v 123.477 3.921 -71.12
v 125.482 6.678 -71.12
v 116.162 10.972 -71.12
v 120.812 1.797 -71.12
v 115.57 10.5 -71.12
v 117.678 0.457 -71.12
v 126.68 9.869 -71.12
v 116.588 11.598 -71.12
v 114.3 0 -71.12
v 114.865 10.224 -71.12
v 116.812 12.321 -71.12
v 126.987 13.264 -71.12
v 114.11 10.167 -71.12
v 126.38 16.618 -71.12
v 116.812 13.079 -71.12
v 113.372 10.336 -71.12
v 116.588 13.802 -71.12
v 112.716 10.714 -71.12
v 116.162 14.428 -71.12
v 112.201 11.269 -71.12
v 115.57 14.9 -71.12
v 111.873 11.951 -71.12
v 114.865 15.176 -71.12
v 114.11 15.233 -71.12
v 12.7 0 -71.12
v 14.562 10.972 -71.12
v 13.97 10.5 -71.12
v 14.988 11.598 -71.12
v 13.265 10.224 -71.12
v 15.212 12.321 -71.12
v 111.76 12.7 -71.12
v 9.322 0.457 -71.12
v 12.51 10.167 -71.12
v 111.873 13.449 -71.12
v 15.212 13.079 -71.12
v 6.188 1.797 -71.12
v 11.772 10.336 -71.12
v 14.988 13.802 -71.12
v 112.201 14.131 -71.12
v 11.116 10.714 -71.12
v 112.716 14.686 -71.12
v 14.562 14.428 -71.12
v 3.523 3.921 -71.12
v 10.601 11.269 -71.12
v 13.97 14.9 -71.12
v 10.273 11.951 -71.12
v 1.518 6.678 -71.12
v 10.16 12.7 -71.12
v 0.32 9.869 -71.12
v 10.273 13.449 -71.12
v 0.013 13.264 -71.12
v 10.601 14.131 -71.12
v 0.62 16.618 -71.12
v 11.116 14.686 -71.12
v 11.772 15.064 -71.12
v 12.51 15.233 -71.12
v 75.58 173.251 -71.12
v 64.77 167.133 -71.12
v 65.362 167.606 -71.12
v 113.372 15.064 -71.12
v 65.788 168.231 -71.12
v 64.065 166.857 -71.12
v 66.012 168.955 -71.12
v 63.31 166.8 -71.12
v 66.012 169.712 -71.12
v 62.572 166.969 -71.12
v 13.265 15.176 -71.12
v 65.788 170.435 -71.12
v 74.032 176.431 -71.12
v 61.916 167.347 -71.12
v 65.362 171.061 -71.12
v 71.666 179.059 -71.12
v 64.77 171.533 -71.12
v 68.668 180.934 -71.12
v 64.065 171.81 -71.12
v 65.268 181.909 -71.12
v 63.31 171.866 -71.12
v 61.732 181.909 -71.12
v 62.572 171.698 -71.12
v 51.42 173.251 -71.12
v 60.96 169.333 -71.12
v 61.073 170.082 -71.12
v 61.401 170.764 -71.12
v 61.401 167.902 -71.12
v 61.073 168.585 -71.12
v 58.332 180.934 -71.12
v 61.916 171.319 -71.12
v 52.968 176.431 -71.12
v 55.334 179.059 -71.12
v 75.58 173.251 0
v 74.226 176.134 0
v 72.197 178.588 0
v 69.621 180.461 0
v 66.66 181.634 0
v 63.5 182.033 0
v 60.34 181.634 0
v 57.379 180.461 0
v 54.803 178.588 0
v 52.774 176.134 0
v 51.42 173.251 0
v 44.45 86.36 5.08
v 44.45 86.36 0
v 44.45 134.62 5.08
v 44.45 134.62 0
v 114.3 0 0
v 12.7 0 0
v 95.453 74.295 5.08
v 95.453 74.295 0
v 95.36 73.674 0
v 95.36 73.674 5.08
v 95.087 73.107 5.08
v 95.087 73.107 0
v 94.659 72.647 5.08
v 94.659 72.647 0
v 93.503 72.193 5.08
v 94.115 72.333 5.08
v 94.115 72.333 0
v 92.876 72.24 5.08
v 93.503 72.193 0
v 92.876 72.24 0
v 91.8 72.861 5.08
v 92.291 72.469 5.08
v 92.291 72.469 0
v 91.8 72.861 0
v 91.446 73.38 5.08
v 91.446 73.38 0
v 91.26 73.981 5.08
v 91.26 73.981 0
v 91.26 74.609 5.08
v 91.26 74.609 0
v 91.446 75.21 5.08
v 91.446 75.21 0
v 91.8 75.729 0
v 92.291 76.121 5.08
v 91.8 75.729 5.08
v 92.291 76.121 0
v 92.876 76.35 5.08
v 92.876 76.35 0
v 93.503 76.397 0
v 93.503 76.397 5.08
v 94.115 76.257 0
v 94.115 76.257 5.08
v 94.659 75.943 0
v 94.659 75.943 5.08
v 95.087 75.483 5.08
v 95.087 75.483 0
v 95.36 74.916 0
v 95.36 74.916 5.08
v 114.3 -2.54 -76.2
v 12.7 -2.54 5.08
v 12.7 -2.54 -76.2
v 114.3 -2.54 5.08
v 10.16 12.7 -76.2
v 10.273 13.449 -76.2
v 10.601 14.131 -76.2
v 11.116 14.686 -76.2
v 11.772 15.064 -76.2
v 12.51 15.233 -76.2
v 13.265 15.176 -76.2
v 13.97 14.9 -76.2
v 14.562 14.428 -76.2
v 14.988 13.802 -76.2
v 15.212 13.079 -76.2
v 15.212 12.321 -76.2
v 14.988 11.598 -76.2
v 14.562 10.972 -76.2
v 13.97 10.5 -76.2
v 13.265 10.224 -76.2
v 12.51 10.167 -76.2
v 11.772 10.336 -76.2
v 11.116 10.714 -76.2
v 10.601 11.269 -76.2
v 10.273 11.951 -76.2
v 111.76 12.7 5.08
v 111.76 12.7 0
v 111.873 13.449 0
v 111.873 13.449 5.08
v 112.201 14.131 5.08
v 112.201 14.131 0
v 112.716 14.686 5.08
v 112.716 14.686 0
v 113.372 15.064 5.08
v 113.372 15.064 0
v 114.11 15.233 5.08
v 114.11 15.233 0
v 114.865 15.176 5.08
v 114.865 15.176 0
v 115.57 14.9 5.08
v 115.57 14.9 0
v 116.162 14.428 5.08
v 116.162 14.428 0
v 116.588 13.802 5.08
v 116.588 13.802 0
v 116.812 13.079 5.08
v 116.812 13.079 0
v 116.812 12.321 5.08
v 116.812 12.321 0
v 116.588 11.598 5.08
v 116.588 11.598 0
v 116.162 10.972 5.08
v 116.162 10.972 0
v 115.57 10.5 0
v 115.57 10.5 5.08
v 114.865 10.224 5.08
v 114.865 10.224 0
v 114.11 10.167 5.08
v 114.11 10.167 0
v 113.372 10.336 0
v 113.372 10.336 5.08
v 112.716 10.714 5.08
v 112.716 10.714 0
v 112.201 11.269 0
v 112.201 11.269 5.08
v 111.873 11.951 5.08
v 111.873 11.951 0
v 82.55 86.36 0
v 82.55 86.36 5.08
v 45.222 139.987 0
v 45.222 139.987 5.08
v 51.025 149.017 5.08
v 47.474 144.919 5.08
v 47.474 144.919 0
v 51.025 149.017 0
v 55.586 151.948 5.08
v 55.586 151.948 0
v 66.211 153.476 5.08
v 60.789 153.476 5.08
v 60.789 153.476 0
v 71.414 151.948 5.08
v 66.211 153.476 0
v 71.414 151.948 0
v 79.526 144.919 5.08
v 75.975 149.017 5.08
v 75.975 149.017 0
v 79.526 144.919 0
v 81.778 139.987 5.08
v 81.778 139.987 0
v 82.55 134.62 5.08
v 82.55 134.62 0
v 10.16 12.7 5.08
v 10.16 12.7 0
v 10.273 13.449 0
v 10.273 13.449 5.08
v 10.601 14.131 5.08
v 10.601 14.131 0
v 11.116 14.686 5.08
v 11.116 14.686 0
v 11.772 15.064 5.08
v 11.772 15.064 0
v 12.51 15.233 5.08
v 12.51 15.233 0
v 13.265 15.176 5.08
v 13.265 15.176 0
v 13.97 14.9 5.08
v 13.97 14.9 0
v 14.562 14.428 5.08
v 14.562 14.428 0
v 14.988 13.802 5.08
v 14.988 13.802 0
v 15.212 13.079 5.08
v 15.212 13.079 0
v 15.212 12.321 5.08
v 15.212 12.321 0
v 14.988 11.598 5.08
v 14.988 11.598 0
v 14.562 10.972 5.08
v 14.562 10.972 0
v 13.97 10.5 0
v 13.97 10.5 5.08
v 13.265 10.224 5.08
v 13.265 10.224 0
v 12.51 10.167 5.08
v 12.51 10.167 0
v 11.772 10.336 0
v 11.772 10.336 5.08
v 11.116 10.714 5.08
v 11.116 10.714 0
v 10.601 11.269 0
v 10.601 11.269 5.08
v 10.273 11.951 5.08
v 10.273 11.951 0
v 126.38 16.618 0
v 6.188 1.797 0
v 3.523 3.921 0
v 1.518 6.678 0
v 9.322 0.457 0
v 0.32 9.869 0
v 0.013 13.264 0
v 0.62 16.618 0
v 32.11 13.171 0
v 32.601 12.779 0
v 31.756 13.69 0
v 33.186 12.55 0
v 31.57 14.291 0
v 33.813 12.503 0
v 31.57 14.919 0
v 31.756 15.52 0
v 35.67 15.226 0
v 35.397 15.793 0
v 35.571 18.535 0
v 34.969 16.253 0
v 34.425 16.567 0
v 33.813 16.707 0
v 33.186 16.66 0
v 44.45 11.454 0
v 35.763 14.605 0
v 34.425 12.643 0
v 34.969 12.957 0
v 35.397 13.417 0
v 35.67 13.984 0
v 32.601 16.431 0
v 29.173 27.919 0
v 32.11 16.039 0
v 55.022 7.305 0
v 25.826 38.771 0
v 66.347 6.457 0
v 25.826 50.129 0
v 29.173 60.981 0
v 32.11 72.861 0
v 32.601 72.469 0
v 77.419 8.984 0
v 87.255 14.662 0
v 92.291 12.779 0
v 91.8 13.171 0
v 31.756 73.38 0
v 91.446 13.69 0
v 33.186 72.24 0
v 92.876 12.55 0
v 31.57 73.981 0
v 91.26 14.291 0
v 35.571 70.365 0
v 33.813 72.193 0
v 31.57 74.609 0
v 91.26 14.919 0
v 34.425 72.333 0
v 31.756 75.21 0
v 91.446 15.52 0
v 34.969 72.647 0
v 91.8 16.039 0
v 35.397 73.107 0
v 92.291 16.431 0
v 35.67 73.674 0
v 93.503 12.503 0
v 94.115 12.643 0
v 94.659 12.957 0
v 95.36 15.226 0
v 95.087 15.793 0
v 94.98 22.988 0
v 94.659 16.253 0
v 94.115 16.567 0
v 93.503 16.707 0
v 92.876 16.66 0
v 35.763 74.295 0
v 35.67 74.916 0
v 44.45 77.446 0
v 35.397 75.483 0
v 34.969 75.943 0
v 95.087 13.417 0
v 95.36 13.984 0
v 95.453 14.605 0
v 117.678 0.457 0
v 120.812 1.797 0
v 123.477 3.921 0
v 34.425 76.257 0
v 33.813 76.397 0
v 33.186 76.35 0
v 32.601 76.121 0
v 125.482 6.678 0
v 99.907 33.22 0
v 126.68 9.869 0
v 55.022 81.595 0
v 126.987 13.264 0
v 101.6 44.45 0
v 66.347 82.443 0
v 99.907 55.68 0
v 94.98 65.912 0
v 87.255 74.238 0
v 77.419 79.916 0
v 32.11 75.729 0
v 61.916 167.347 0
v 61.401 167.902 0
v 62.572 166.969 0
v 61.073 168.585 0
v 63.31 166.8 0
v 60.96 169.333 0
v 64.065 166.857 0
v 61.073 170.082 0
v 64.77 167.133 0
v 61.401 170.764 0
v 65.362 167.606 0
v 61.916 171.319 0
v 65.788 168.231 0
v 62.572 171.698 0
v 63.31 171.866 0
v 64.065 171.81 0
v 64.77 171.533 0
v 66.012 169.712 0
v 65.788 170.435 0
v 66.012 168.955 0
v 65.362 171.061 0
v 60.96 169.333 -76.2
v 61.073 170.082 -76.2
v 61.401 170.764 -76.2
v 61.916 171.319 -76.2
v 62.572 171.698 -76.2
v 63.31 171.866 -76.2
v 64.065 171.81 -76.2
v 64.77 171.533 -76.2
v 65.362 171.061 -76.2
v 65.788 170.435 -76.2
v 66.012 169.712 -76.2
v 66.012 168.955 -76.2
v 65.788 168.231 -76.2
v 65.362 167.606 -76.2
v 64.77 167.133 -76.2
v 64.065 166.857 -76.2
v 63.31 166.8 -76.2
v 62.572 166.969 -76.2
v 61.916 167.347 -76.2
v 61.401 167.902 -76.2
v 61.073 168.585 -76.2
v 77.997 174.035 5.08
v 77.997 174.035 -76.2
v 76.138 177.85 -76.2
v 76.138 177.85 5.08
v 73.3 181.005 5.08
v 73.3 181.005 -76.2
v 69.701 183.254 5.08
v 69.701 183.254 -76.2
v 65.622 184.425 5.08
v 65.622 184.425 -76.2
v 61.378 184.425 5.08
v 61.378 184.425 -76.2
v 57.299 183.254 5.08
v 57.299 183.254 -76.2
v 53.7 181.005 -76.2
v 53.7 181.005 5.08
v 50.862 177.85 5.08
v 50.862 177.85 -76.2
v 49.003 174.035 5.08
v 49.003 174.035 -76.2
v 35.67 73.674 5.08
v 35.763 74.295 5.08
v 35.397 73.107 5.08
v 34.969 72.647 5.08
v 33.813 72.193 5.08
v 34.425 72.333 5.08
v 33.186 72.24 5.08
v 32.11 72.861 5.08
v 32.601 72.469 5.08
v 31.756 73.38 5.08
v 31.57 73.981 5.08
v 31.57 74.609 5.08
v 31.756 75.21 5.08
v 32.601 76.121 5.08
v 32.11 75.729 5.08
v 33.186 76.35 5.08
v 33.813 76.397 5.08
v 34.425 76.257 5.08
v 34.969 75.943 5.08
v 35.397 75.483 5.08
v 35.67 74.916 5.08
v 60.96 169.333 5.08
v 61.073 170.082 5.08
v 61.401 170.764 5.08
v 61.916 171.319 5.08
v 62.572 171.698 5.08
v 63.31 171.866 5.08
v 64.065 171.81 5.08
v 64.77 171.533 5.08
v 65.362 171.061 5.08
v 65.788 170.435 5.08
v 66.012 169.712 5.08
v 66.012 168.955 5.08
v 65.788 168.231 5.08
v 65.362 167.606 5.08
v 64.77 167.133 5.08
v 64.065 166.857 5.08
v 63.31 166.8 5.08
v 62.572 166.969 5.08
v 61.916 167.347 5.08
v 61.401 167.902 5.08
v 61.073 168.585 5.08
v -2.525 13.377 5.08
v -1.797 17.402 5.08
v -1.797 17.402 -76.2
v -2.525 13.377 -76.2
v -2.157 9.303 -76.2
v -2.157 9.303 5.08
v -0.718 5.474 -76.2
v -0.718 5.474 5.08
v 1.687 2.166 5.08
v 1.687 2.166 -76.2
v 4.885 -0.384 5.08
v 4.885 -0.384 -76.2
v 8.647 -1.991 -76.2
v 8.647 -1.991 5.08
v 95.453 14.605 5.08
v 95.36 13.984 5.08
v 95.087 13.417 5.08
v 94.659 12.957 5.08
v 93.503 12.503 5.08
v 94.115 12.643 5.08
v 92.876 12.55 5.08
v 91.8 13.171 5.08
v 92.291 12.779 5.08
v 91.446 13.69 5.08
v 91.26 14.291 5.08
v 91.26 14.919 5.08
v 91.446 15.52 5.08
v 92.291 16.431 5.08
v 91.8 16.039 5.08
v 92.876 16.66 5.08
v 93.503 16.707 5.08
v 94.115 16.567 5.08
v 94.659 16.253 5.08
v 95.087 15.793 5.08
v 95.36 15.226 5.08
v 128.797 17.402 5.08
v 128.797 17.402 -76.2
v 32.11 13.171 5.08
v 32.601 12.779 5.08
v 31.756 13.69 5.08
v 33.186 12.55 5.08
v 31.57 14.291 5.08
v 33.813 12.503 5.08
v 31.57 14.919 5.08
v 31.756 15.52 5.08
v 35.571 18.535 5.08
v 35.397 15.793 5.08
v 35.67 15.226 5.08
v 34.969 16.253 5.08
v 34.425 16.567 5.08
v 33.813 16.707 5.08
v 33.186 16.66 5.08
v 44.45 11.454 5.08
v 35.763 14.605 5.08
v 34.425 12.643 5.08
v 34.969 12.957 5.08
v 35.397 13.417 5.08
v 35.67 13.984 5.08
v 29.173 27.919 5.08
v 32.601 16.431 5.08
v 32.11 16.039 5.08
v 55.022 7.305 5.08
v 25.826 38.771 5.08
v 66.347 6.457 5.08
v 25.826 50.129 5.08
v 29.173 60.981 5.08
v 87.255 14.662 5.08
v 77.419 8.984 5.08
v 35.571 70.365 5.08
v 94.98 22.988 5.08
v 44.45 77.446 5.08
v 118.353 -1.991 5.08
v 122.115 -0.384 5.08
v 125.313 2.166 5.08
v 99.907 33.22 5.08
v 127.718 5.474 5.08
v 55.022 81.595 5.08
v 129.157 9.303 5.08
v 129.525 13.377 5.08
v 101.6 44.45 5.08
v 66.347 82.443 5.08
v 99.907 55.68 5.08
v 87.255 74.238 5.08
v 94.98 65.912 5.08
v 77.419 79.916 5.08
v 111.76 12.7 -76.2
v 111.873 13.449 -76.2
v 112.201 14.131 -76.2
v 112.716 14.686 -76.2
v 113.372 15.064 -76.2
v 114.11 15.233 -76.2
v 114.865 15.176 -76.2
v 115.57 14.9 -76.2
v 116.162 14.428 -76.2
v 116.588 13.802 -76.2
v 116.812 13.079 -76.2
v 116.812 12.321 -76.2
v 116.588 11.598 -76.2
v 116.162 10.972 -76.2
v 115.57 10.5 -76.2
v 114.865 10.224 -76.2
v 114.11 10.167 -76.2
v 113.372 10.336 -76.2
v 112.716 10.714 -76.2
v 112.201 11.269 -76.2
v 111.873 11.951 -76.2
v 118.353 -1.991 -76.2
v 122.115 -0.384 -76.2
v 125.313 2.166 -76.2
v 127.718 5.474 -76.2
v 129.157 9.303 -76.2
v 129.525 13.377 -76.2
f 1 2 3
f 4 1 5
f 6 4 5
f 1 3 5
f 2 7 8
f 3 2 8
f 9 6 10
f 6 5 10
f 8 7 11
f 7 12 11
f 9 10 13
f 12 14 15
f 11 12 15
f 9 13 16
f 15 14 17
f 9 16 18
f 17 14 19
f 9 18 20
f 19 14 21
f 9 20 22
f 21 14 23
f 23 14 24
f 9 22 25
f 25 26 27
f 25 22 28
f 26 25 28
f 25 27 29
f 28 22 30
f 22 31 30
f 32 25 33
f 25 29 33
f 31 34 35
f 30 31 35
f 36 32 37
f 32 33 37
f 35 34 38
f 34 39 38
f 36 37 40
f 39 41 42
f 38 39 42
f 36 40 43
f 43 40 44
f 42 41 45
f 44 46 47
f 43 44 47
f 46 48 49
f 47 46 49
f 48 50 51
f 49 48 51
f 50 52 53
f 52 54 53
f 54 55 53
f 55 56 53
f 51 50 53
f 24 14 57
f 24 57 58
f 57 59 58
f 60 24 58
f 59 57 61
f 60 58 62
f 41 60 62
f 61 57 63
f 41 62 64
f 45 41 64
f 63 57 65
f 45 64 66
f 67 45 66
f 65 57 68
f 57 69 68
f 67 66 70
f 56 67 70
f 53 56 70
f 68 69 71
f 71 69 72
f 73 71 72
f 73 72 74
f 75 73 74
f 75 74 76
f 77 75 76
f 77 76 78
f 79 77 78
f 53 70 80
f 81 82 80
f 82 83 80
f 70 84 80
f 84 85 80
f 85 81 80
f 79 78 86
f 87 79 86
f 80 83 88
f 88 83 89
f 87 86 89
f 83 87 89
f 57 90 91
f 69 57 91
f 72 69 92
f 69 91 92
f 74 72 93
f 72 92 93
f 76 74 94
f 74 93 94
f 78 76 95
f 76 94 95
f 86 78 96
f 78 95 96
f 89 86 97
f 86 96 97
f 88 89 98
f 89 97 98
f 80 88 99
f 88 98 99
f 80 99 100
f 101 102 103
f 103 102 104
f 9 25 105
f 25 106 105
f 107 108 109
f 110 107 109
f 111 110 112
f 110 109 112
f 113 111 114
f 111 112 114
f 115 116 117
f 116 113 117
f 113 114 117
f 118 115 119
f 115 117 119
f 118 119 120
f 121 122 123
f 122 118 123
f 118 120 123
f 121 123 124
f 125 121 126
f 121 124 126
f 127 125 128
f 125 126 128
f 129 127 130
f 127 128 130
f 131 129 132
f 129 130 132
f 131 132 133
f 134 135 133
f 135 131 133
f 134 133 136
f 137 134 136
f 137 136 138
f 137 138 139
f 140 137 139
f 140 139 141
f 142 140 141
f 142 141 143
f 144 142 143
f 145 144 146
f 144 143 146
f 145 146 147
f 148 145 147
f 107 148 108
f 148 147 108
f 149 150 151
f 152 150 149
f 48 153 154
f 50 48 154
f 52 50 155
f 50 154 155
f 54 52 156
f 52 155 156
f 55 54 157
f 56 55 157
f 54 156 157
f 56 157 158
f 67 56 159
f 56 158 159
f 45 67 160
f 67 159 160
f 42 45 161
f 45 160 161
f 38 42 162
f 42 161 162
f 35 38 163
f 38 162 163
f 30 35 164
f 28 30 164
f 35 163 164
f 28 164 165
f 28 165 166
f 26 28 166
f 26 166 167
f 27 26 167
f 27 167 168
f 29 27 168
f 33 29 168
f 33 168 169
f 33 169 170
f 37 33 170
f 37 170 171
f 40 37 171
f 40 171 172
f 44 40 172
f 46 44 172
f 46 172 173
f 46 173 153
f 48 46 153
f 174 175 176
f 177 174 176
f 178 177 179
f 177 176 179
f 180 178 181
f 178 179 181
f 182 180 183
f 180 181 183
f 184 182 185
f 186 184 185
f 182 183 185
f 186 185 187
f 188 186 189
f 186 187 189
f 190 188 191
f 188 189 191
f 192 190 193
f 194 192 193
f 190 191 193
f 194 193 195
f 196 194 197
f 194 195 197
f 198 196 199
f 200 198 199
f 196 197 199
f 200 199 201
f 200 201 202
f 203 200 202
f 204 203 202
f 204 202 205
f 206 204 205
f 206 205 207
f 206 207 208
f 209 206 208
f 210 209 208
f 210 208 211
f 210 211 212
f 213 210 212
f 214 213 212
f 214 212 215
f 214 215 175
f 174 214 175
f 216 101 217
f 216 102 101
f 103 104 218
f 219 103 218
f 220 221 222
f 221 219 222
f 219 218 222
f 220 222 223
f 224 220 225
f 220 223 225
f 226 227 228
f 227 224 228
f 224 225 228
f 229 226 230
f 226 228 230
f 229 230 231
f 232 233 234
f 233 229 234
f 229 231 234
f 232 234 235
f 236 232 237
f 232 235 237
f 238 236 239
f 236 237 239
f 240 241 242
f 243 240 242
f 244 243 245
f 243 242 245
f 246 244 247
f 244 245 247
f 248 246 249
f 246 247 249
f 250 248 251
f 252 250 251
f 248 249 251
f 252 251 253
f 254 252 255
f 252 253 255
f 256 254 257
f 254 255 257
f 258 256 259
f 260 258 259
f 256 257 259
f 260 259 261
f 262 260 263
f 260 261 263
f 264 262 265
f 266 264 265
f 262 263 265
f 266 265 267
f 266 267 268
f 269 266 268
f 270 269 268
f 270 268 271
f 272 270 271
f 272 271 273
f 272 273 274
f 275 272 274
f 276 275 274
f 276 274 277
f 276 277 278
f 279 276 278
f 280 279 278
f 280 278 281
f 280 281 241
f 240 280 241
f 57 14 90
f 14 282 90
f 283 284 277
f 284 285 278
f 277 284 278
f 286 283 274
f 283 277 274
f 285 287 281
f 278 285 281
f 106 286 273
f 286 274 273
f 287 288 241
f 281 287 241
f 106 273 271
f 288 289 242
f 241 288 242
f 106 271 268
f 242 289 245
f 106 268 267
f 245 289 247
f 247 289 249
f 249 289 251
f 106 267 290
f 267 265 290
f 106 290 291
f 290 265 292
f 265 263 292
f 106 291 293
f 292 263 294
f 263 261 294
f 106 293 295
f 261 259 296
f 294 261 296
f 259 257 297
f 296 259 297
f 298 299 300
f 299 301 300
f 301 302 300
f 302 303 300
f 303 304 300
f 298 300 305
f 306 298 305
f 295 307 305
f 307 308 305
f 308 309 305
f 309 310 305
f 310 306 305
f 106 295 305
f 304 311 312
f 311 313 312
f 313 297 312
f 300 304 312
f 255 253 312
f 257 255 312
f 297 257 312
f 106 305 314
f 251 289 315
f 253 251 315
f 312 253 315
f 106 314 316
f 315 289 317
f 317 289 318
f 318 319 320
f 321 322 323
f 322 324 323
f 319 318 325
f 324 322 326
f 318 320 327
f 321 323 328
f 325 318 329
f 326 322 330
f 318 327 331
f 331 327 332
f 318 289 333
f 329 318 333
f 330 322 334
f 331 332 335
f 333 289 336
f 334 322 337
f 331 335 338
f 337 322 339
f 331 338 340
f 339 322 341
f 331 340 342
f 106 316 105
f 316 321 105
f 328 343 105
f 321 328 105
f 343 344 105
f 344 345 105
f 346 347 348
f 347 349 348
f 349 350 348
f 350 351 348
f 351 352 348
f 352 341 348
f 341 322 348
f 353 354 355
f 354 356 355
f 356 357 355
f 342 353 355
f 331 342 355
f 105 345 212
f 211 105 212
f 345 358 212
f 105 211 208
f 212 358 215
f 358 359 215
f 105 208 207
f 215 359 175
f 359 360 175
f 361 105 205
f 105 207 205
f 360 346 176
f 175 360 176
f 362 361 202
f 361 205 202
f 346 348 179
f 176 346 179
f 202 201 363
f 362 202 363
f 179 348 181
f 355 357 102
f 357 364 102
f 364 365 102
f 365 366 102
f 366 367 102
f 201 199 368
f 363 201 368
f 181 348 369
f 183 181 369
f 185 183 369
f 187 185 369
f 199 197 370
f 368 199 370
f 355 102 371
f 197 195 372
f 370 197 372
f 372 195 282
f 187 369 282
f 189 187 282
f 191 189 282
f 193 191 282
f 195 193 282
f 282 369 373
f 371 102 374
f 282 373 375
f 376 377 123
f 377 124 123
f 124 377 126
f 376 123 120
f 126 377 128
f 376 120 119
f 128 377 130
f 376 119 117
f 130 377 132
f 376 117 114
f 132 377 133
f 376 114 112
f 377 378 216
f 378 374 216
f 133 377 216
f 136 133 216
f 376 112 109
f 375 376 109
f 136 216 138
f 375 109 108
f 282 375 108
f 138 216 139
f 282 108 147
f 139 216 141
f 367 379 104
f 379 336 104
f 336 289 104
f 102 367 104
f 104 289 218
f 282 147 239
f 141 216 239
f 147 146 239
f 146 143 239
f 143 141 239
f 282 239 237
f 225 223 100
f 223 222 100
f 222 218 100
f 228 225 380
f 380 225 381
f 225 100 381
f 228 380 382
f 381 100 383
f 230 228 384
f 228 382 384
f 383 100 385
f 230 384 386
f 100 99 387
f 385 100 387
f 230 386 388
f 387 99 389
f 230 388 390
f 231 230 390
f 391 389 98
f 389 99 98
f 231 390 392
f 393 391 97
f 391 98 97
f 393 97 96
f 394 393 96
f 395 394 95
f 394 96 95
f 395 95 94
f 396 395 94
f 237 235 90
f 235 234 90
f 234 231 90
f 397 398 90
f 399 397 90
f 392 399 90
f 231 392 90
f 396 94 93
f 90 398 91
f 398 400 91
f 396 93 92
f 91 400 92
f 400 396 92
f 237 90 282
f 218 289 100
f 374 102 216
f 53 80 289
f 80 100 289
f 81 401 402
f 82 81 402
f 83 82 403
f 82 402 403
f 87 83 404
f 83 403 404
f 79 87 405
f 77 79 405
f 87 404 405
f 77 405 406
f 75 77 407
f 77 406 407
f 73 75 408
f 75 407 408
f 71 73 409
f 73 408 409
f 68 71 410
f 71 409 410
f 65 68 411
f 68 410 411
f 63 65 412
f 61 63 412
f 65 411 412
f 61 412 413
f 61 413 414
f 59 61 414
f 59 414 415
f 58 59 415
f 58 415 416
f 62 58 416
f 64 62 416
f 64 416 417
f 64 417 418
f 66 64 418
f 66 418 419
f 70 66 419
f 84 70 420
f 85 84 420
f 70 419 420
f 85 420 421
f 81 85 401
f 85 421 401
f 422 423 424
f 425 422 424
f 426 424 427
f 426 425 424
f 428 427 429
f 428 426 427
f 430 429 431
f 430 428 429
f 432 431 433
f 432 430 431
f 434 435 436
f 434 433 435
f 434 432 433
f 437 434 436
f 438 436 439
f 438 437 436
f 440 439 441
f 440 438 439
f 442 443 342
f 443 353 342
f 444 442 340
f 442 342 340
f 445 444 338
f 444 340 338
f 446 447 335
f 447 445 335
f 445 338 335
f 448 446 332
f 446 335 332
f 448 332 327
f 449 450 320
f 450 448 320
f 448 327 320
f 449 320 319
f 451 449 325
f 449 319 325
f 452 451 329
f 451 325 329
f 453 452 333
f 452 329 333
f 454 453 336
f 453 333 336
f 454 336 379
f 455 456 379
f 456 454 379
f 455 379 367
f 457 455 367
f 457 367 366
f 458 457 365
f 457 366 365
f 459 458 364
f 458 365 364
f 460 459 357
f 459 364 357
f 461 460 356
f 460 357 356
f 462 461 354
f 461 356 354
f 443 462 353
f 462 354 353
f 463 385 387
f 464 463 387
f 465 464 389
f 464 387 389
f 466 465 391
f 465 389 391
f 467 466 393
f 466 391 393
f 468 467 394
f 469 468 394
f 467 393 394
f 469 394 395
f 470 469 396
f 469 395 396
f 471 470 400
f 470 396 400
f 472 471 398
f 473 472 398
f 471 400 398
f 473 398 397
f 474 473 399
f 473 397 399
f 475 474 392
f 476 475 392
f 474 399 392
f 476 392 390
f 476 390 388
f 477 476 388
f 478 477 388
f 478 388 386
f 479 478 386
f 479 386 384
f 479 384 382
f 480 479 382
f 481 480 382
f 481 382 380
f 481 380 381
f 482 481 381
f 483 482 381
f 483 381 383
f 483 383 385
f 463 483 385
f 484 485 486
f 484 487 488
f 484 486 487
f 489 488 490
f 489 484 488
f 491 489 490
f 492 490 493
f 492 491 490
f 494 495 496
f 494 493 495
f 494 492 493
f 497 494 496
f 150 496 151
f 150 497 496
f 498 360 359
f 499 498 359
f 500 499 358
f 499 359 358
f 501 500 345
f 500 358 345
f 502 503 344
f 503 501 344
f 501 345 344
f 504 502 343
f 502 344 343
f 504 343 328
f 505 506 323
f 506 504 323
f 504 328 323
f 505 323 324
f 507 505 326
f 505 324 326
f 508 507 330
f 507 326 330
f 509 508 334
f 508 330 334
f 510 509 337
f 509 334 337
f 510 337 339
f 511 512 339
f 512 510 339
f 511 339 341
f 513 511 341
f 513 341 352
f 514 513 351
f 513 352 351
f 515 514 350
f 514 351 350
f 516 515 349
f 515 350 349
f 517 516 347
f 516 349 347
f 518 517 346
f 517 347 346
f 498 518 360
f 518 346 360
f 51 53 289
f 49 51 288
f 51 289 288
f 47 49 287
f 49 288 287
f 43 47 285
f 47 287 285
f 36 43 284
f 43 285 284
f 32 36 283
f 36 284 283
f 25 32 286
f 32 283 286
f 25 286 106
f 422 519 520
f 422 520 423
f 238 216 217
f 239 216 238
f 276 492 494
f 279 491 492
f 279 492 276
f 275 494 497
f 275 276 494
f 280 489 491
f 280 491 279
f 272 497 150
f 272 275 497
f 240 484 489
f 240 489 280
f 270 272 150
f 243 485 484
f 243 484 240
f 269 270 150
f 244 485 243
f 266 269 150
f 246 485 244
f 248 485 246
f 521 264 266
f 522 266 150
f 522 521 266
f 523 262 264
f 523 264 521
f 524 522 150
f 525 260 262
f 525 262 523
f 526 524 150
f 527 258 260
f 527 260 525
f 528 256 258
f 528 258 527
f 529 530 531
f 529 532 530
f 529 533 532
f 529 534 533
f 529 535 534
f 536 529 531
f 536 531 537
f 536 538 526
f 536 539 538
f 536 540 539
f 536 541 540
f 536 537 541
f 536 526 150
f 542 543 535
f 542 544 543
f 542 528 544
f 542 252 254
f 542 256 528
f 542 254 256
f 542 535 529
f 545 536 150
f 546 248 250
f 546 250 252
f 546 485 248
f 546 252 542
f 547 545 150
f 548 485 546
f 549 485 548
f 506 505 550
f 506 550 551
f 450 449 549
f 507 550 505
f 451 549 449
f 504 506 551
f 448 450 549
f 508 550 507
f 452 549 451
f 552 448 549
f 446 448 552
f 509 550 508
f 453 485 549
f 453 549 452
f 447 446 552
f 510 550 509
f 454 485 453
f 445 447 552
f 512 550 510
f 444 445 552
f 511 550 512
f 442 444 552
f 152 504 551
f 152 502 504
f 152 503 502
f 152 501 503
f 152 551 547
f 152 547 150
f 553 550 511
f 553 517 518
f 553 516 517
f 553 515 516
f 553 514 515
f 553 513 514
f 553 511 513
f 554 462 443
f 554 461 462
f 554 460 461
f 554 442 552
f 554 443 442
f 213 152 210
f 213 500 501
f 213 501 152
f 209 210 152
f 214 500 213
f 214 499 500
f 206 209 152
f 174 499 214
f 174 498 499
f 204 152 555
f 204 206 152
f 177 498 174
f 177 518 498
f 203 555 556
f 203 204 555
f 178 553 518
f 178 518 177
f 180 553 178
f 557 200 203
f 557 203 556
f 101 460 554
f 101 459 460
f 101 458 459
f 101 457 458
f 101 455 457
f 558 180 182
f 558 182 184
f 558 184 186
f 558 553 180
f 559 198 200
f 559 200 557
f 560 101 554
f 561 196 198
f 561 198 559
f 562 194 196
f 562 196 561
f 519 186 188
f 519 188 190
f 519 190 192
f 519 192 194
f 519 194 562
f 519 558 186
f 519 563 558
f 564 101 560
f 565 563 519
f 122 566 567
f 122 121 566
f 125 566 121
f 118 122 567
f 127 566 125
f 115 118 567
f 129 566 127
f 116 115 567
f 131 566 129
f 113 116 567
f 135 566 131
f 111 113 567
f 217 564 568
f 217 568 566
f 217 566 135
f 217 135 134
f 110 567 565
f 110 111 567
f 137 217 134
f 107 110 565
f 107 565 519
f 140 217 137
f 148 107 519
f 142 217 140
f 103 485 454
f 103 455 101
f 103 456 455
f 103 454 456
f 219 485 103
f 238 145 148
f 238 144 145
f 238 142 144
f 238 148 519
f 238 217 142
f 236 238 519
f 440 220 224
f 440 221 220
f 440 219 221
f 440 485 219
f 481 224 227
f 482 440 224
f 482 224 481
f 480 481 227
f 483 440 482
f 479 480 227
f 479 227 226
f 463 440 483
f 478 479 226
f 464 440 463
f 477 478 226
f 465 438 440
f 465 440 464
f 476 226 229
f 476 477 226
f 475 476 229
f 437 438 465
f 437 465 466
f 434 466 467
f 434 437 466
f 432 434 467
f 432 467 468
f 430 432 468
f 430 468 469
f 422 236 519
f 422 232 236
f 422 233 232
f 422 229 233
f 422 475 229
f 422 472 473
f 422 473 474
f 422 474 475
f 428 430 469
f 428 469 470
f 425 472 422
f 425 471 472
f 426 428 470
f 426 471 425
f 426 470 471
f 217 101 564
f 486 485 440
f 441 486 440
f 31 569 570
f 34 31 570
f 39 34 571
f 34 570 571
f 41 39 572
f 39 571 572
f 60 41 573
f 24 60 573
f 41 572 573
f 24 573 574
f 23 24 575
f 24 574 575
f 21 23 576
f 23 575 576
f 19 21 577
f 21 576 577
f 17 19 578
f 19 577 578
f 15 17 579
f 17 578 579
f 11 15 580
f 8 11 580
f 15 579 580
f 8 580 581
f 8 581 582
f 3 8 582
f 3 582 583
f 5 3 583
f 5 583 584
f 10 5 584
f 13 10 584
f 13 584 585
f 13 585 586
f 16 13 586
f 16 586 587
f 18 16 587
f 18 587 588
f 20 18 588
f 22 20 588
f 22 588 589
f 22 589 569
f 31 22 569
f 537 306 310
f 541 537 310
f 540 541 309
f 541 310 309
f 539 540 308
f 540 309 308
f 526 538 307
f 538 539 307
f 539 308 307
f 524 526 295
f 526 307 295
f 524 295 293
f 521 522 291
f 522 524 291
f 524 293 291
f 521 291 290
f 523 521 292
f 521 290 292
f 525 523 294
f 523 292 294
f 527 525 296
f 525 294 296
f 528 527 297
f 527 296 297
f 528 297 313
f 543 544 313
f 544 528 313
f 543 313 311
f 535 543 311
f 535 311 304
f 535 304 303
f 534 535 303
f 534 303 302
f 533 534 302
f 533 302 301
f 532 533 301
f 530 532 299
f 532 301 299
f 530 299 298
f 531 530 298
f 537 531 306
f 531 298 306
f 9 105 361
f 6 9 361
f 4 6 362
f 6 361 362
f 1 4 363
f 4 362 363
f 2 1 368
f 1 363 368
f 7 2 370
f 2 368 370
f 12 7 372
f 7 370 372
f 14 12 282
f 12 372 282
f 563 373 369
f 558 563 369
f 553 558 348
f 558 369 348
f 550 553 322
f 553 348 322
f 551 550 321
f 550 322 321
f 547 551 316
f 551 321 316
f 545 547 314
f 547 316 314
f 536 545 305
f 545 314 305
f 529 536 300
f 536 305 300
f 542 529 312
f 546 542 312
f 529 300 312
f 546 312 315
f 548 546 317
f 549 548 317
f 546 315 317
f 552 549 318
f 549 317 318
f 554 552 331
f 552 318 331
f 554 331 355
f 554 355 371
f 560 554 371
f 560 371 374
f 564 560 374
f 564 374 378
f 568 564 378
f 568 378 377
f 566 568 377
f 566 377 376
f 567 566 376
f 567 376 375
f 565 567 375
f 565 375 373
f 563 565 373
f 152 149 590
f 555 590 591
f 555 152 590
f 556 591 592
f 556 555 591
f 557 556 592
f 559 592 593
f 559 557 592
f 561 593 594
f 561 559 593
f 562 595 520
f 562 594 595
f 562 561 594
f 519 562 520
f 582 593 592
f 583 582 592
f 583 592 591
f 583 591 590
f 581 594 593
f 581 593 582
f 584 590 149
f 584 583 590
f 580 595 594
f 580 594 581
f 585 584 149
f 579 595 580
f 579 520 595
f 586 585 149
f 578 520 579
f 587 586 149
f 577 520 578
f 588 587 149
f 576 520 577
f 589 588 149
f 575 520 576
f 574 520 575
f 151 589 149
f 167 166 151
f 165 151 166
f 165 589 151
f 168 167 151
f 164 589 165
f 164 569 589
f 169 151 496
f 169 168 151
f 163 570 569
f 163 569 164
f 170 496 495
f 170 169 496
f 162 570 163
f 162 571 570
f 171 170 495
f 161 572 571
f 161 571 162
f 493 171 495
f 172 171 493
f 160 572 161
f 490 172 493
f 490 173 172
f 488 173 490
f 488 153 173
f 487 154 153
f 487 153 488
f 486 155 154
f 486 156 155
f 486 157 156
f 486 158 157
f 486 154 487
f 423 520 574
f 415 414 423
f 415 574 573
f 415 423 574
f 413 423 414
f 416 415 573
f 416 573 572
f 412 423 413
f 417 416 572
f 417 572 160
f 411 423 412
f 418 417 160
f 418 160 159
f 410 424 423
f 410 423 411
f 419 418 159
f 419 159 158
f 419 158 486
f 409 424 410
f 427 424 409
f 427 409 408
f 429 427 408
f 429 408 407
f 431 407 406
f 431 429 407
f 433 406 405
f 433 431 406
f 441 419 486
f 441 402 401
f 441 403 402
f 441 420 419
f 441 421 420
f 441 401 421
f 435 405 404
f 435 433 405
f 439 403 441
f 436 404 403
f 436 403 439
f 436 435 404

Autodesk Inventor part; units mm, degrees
ref_plane "YZ Plane" through (0, 0, 0) normal (1, 0, 0) x (0, 1, 0)
ref_plane "XZ Plane" through (0, 0, 0) normal (0, 1, 0) x (-1, 0, 0)
ref_plane "XY Plane" through (0, 0, 0) normal (0, 0, 1) x (1, 0, 0)
sketch "Sketch1" plane through (0, 0, 0) normal (0, 0, 1) x (1, 0, 0)
  arc A0 (0.6195, 16.618) -> (12.7, 0) centre (12.7, 12.7) ccw
  arc A1 (63.5, 182.0332) -> (51.4195, 173.2512) centre (63.5, 169.3332) ccw
  line L0 (0.6195, 16.618) -> (51.4195, 173.2512)
  arc A2 (114.3, 0) -> (126.3805, 16.618) centre (114.3, 12.7) ccw
  arc A3 (75.5805, 173.2512) -> (63.5, 182.0332) centre (63.5, 169.3332) ccw
  line L1 (126.3805, 16.618) -> (75.5805, 173.2512)
  line L2 (12.7, 0) -> (114.3, 0)
  line L3 (63.5, 50.8) -> (63.5, 44.45)
  circle A4 centre (63.5, 44.45) radius 38.1
  circle A5 centre (33.655, 74.295) radius 2.1082
  circle A6 centre (93.345, 74.295) radius 2.1082
  circle A7 centre (93.345, 14.605) radius 2.1082
  circle A8 centre (33.655, 14.605) radius 2.1082
  line L4 (63.5, 82.55) -> (63.5, 86.36)
  line L5 (63.5, 86.36) -> (82.55, 86.36)
  line L6 (63.5, 86.36) -> (44.45, 86.36)
  line L7 (82.55, 86.36) -> (82.55, 134.62)
  line L8 (44.45, 86.36) -> (44.45, 134.62)
  arc A9 (82.55, 134.62) -> (44.45, 134.62) centre (63.5, 134.62) ccw
  point P0 (0, 0)
  dimension "d30" = 76.2
  dimension "d7" = 25.4
  dimension "d9" = 12.7
  dimension "d10" = 12.7
  dimension "d11" = 12.7
  dimension "d14" = 101.6
  dimension "d15" = 35.938
  dimension "d16" = 72.031
  dimension "d17" = 12.7
  dimension "d18" = 169.3332
  dimension "d19" = 109.3442
  dimension "d20" = 164.6651
  dimension "d21" = 164.6651
  dimension "d29" = 6.35
  dimension "d33" = 4.2164
  dimension "d34" = 4.2164
  dimension "d35" = 4.2164
  dimension "d36" = 4.2164
  dimension "d50" = 3.81
  dimension "d51" = 19.05
  dimension "d52" = 19.05
  dimension "d53" = 48.26
  dimension "d54" = 48.26
extrude "Extrusion2" add sketch "Sketch1" along normal blind 5.08
sketch "Sketch2" plane through (0, 0, 0) normal (0, 0, -1) x (-1, 0, 0)
  line L0 (-126.3805, 16.618) -> (-75.5805, 173.2512) projected
  line L1 (-126.3805, 16.618) -> (-75.5805, 173.2512)
  line L2 (-51.4195, 173.2512) -> (-0.6195, 16.618) projected
  line L3 (-51.4195, 173.2512) -> (-0.6195, 16.618)
  line L4 (-12.7, 0) -> (-114.3, 0) projected
  line L5 (-114.3, 0) -> (-12.7, 0)
  arc A0 (-126.3805, 16.618) -> (-114.3, 0) centre (-114.3, 12.7) ccw projected
  arc A1 (-126.3805, 16.618) -> (-126.3805, 16.618) centre (-114.3, 12.7) ccw
  arc A2 (-12.7, 0) -> (-0.6195, 16.618) centre (-12.7, 12.7) ccw projected
  arc A3 (-12.7, 0) -> (-12.7, 0) centre (-12.7, 12.7) ccw
  arc A4 (-51.4195, 173.2512) -> (-75.5805, 173.2512) centre (-63.5, 169.3332) ccw projected
  arc A5 (-75.5805, 173.2512) -> (-75.5805, 173.2512) centre (-63.5, 169.3332) ccw
  arc A6 (-49.0034, 174.0348) -> (-77.9966, 174.0348) centre (-63.5, 169.3332) ccw
  arc A7 (-128.7966, 17.4016) -> (-114.3, -2.54) centre (-114.3, 12.7) ccw
  arc A8 (-12.7, -2.54) -> (1.7966, 17.4016) centre (-12.7, 12.7) ccw
  line L6 (-12.7, -2.54) -> (-114.3, -2.54)
  line L7 (-77.9966, 174.0348) -> (-128.7966, 17.4016)
  line L8 (-49.0034, 174.0348) -> (1.7966, 17.4016)
  point P0 (0, 0)
  dimension "d57" = 30.48
  dimension "d58" = 30.48
  dimension "d59" = 30.48
extrude "Extrusion3" add sketch "Sketch2" along normal blind 71.12 and the other way blind 5.08
sketch "Sketch3" plane through (0, 0, -71.12) normal (0, 0, -1) x (-1, 0, 0)
  line L0 (-12.7, -2.54) -> (-114.3, -2.54) projected
  line L1 (-114.3, -2.54) -> (-12.7, -2.54)
  line L2 (1.7966, 17.4016) -> (-49.0034, 174.0348) projected
  line L3 (1.7966, 17.4016) -> (-49.0034, 174.0348)
  line L4 (-128.7966, 17.4016) -> (-77.9966, 174.0348) projected
  line L5 (-77.9966, 174.0348) -> (-128.7966, 17.4016)
  arc A0 (-128.7966, 17.4016) -> (-114.3, -2.54) centre (-114.3, 12.7) ccw projected
  arc A1 (-128.7966, 17.4016) -> (-114.3, -2.54) centre (-114.3, 12.7) ccw
  arc A2 (-12.7, -2.54) -> (1.7966, 17.4016) centre (-12.7, 12.7) ccw projected
  arc A3 (-12.7, -2.54) -> (1.7966, 17.4016) centre (-12.7, 12.7) ccw
  arc A4 (-49.0034, 174.0348) -> (-77.9966, 174.0348) centre (-63.5, 169.3332) ccw
  point P0 (0, 0)
extrude "Extrusion4" add sketch "Sketch3" along normal blind 5.08
sketch "Sketch4" plane through (0, 0, -76.2) normal (0, 0, -1) x (-1, 0, 0)
  arc A0 (-49.0034, 174.0348) -> (-77.9966, 174.0348) centre (-63.5, 169.3332) ccw projected
  circle A1 centre (-63.5, 169.3332) radius 2.54
  arc A2 (-126.3805, 16.618) -> (-114.3, 0) centre (-114.3, 12.7) ccw projected
  circle A3 centre (-114.3, 12.7) radius 2.54
  arc A4 (-12.7, 0) -> (-0.6195, 16.618) centre (-12.7, 12.7) ccw projected
  circle A5 centre (-12.7, 12.7) radius 2.54
  point P0 (0, 0)
  dimension "d66" = 5.08
  dimension "d67" = 5.08
  dimension "d68" = 5.08
extrude "Extrusion5" cut sketch "Sketch4" against normal blind 81.28
properties part number "Nathan_New_LED_Speaker"
